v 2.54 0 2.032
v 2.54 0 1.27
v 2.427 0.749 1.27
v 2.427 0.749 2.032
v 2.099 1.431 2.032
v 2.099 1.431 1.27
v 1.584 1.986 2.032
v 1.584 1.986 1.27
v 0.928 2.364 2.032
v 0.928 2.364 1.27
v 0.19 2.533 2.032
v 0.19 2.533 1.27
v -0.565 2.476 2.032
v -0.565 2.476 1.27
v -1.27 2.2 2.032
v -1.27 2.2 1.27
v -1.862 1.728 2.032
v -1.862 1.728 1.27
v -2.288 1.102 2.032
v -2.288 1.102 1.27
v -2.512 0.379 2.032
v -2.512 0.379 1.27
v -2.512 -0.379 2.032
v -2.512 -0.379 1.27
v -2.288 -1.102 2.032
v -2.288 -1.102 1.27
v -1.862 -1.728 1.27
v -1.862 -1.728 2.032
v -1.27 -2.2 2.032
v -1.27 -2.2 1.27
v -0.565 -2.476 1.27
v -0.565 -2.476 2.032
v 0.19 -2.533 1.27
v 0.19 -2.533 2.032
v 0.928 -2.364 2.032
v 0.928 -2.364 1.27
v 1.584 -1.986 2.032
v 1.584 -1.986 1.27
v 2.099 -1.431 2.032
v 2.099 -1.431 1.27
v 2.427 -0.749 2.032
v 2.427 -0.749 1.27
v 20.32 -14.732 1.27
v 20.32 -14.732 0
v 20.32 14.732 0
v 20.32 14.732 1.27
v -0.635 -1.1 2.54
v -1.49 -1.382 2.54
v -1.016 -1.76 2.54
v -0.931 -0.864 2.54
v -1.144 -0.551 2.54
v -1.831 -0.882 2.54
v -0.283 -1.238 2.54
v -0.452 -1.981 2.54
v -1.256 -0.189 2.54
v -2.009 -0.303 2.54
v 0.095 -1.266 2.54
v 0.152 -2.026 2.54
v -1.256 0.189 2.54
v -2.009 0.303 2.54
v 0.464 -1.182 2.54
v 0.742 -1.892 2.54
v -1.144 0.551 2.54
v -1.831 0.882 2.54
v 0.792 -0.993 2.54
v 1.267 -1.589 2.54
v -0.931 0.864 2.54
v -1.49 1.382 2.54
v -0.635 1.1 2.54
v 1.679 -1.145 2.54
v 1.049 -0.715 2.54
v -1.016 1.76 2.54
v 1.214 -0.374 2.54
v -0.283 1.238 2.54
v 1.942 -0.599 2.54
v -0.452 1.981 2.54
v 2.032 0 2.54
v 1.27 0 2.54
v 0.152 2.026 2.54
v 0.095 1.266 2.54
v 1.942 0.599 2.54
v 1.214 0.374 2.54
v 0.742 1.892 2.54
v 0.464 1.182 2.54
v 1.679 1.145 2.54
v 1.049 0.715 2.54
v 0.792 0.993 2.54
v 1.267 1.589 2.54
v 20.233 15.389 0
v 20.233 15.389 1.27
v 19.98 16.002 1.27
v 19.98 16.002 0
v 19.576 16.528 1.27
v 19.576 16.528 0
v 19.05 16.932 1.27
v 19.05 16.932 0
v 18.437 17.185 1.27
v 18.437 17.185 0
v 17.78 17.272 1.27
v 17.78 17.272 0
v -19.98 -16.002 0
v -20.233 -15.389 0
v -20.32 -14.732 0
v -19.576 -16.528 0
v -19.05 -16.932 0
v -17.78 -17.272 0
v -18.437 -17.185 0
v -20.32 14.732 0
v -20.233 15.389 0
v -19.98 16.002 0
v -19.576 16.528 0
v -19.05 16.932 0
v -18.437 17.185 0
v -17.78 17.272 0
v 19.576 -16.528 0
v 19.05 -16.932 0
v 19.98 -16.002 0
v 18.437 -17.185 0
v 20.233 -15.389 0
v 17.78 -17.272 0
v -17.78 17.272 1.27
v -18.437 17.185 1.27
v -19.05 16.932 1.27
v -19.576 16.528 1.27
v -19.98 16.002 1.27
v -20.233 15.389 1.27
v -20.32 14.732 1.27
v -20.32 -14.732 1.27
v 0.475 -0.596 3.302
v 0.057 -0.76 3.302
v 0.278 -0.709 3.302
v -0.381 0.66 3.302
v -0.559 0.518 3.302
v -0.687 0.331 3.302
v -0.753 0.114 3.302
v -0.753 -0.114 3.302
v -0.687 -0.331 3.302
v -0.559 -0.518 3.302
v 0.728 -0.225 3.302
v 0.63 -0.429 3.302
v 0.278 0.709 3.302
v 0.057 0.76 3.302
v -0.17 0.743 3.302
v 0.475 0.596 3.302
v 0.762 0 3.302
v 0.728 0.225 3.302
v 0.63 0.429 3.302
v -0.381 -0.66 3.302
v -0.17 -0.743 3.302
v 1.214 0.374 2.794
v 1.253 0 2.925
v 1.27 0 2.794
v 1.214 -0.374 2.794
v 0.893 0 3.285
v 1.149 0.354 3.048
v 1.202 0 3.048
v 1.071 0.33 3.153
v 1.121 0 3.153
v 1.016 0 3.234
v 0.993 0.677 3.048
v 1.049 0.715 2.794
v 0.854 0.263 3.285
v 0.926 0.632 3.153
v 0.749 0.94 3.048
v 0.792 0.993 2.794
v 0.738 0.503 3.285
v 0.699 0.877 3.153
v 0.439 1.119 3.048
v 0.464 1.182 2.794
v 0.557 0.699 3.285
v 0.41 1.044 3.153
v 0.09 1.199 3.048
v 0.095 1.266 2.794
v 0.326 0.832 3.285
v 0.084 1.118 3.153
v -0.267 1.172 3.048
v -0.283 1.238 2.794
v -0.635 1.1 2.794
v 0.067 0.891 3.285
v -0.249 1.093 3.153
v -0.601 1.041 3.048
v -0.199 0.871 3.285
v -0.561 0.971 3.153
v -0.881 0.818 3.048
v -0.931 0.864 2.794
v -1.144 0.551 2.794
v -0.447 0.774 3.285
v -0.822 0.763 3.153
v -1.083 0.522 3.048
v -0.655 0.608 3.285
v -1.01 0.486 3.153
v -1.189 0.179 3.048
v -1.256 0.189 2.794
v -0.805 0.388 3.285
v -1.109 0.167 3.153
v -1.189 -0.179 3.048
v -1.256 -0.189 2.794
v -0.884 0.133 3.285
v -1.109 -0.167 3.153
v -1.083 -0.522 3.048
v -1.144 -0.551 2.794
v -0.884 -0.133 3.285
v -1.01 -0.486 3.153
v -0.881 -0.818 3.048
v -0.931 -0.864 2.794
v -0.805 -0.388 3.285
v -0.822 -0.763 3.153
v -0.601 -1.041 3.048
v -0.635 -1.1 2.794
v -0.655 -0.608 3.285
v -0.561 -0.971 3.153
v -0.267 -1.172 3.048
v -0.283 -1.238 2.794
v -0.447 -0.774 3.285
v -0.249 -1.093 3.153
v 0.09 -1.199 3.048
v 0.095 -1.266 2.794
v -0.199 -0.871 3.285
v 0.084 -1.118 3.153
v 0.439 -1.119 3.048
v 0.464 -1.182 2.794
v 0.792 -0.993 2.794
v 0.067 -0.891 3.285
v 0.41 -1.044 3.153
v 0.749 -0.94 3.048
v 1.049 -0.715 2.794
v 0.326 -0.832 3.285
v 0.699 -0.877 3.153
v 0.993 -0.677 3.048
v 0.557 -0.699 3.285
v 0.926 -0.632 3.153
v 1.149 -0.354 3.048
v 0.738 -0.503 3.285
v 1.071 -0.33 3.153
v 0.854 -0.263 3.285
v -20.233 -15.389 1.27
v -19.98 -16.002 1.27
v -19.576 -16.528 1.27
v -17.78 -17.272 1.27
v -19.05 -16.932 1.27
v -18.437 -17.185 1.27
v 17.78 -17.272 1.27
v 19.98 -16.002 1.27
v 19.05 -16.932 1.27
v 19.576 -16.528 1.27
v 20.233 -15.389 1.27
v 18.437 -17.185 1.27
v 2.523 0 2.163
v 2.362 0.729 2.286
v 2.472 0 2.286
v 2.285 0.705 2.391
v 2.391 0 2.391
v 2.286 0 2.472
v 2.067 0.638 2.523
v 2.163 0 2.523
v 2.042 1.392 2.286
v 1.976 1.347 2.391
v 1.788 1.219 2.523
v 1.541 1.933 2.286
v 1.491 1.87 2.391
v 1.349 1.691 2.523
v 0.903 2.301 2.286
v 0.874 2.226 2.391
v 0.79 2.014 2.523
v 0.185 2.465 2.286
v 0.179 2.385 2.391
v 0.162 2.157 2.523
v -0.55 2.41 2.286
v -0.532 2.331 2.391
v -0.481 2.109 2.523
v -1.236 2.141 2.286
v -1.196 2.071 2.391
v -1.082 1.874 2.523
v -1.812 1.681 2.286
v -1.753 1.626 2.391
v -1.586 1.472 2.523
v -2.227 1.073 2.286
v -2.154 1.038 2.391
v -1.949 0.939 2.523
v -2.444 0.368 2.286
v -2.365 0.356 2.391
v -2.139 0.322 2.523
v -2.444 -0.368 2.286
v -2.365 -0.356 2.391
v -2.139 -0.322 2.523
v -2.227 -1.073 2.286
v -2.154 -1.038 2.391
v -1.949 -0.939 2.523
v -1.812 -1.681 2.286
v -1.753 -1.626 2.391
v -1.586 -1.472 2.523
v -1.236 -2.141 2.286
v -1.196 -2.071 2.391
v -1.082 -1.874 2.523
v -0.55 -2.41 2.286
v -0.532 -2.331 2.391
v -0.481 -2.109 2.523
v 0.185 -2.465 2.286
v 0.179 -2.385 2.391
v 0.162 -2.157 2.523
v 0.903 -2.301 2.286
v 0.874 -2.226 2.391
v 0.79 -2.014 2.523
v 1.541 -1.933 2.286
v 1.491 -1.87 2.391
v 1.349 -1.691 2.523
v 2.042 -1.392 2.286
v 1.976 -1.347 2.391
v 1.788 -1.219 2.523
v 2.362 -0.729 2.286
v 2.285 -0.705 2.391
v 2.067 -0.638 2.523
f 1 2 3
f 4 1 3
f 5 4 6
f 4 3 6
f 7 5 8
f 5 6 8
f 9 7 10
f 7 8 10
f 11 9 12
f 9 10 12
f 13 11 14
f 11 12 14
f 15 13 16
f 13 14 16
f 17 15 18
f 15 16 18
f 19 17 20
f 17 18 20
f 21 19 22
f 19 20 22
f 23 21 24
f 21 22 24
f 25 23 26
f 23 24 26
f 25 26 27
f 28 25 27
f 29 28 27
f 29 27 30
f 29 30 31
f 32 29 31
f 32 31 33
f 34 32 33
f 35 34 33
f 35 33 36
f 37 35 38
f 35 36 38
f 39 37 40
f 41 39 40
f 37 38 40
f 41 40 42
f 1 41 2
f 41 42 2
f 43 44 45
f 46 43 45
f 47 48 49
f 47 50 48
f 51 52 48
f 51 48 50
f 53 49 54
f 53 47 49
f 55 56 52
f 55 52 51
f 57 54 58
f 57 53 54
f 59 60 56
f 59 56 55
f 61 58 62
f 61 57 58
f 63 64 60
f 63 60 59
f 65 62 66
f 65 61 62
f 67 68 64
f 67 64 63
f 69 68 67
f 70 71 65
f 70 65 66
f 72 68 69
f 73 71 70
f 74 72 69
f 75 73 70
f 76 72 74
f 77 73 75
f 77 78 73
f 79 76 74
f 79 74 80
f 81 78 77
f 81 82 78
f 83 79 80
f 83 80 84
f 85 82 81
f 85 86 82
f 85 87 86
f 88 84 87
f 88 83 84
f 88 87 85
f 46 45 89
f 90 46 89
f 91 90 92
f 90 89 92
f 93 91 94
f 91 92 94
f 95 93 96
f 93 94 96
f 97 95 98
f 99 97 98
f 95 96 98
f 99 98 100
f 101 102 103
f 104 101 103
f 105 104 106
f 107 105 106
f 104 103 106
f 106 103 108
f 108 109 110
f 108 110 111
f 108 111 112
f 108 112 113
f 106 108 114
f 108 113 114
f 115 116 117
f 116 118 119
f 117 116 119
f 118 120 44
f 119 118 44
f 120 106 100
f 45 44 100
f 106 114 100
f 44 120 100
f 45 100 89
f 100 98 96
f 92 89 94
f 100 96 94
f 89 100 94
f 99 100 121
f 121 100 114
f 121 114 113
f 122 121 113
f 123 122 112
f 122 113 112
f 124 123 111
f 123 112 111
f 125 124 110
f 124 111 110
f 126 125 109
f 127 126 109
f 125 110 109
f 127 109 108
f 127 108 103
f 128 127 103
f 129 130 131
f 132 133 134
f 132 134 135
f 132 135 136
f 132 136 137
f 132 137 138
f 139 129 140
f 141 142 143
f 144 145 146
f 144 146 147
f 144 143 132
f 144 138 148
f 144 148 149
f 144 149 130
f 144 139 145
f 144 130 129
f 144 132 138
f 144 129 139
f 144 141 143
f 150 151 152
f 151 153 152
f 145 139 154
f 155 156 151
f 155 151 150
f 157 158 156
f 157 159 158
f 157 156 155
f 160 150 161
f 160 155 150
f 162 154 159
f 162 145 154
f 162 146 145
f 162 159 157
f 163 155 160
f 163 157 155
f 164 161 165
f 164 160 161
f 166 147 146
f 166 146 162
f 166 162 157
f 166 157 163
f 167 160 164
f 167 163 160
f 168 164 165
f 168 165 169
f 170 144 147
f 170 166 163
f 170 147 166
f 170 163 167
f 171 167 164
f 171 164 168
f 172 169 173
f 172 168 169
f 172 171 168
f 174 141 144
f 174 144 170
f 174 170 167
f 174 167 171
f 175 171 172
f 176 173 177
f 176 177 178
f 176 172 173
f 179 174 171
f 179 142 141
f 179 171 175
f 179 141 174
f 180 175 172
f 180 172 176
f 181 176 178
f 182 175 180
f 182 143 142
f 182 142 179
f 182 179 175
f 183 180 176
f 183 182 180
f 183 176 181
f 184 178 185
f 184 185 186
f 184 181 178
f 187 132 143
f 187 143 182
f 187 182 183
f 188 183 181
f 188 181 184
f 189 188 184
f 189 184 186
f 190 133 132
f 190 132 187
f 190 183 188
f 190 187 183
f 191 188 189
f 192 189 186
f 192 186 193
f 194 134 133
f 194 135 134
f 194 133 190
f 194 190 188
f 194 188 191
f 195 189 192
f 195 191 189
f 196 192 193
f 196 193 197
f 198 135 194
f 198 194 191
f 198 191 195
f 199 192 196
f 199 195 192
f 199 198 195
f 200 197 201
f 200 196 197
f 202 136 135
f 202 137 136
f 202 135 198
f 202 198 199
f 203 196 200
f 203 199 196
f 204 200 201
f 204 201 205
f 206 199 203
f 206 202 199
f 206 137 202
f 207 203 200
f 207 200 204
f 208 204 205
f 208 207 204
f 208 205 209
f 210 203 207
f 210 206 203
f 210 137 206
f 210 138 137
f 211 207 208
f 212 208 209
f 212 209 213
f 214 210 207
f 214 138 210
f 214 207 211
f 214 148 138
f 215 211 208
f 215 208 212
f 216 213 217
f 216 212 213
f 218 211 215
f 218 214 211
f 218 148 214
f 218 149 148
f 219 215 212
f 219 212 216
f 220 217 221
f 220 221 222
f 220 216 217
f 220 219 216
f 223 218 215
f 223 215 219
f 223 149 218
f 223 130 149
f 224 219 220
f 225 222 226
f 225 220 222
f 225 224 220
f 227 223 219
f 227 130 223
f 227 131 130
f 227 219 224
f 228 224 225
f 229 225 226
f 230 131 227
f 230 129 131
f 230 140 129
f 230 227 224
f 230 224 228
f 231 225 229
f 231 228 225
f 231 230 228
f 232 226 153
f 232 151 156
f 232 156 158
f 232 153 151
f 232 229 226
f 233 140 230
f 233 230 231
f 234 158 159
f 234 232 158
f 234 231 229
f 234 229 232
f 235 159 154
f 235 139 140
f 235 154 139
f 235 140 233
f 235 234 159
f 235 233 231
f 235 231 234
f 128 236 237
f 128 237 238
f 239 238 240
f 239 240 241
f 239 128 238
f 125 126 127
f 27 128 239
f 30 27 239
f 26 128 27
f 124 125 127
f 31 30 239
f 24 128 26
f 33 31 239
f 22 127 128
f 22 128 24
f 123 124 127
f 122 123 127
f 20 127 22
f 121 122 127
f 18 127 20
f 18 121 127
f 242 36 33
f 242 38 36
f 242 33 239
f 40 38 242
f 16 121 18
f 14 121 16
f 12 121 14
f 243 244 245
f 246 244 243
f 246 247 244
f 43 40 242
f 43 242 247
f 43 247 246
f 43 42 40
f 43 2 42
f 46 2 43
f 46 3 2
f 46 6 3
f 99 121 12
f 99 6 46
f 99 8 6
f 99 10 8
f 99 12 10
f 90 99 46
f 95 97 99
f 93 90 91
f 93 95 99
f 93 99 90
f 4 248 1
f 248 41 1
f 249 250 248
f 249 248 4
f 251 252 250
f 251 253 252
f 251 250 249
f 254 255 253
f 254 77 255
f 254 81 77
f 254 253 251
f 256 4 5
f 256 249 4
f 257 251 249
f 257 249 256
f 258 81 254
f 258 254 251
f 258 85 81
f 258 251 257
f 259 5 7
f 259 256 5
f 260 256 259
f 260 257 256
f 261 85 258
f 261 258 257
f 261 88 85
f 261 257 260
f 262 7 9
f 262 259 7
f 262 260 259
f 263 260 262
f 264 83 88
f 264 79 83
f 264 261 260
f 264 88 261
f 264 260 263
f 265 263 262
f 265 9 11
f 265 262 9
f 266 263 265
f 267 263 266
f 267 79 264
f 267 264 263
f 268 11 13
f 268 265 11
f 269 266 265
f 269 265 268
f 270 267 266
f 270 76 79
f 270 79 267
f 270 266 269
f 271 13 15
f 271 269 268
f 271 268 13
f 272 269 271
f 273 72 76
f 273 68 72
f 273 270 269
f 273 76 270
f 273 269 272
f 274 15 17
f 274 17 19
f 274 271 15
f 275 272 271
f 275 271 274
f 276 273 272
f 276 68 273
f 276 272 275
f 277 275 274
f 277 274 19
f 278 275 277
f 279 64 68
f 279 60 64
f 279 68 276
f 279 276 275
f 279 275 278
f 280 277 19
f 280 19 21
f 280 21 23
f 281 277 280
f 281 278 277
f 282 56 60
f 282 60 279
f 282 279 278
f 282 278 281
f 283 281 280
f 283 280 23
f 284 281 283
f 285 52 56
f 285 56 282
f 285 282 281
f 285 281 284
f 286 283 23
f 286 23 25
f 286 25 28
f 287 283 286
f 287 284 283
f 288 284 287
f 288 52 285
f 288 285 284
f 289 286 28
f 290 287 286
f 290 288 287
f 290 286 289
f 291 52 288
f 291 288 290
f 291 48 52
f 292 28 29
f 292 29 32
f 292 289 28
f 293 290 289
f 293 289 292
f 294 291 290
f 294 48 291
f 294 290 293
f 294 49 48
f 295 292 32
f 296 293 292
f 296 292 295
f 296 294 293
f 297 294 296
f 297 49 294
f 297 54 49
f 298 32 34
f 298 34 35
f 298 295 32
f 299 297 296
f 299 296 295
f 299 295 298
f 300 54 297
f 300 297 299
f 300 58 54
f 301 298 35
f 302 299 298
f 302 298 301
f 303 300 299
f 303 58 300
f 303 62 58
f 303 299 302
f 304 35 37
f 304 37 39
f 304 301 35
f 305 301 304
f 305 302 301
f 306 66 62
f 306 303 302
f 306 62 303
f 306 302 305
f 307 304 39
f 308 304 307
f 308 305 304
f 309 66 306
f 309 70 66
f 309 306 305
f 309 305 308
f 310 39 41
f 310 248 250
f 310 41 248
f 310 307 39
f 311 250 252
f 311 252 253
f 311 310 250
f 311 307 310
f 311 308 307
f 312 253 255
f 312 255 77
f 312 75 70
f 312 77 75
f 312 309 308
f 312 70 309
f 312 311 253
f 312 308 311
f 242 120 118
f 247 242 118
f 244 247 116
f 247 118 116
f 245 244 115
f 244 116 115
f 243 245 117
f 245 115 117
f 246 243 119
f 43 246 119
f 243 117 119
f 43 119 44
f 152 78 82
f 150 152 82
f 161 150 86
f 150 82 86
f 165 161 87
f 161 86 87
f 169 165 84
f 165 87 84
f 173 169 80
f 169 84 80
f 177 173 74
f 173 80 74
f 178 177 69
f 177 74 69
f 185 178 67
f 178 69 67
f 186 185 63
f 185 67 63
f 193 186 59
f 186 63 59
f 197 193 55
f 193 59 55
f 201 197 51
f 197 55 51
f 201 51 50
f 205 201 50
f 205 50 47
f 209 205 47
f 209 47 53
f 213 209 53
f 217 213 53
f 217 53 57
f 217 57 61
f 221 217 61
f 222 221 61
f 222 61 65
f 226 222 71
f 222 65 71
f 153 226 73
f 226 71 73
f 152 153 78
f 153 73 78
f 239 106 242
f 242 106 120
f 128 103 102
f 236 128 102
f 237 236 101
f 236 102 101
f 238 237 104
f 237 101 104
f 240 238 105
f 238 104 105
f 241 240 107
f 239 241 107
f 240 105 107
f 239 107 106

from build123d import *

# Parameters (mm, degrees)
F1_DEPTH = 1.27
F2_R     = 2.54
F3_DEPTH = 1.27
F4_R     = 1.27
F5_DEPTH = 0.762
F6_R     = 0.508


with BuildPart() as f1:
    # F0 (on Top) → F1 (new body)
    with BuildSketch(Plane.XY):
        with BuildLine():
            ThreePointArc((20.32, 14.732), (19.576051, 16.528051), (17.78, 17.272))
            Line((17.78, 17.272), (-17.78, 17.272))
            ThreePointArc((-17.78, 17.272), (-19.576051, 16.528051), (-20.32, 14.732))
            Line((-20.32, 14.732), (-20.32, -14.732))
            ThreePointArc((-20.32, -14.732), (-19.576051, -16.528051), (-17.78, -17.272))
            Line((-17.78, -17.272), (17.78, -17.272))
            ThreePointArc((17.78, -17.272), (19.576051, -16.528051), (20.32, -14.732))
            Line((20.32, -14.732), (20.32, 14.732))
        make_face()
    extrude(amount=F1_DEPTH)

    # F2 (on face) → F3 (join)
    with BuildSketch(Plane.XY.offset(1.27)):
        Circle(F2_R)
    extrude(amount=F3_DEPTH)

    # F4 (on face) → F5 (join)
    with BuildSketch(Plane.XY.offset(2.54)):
        Circle(F4_R)
    extrude(amount=F5_DEPTH)

    # F6
    f6_edges = [f1.edges().sort_by_distance(p)[0] for p in [
        (-2.54, 0, 2.54),
        (-1.27, 0, 3.302),
    ]]
    fillet(f6_edges, radius=F6_R)


solid = f1.part
